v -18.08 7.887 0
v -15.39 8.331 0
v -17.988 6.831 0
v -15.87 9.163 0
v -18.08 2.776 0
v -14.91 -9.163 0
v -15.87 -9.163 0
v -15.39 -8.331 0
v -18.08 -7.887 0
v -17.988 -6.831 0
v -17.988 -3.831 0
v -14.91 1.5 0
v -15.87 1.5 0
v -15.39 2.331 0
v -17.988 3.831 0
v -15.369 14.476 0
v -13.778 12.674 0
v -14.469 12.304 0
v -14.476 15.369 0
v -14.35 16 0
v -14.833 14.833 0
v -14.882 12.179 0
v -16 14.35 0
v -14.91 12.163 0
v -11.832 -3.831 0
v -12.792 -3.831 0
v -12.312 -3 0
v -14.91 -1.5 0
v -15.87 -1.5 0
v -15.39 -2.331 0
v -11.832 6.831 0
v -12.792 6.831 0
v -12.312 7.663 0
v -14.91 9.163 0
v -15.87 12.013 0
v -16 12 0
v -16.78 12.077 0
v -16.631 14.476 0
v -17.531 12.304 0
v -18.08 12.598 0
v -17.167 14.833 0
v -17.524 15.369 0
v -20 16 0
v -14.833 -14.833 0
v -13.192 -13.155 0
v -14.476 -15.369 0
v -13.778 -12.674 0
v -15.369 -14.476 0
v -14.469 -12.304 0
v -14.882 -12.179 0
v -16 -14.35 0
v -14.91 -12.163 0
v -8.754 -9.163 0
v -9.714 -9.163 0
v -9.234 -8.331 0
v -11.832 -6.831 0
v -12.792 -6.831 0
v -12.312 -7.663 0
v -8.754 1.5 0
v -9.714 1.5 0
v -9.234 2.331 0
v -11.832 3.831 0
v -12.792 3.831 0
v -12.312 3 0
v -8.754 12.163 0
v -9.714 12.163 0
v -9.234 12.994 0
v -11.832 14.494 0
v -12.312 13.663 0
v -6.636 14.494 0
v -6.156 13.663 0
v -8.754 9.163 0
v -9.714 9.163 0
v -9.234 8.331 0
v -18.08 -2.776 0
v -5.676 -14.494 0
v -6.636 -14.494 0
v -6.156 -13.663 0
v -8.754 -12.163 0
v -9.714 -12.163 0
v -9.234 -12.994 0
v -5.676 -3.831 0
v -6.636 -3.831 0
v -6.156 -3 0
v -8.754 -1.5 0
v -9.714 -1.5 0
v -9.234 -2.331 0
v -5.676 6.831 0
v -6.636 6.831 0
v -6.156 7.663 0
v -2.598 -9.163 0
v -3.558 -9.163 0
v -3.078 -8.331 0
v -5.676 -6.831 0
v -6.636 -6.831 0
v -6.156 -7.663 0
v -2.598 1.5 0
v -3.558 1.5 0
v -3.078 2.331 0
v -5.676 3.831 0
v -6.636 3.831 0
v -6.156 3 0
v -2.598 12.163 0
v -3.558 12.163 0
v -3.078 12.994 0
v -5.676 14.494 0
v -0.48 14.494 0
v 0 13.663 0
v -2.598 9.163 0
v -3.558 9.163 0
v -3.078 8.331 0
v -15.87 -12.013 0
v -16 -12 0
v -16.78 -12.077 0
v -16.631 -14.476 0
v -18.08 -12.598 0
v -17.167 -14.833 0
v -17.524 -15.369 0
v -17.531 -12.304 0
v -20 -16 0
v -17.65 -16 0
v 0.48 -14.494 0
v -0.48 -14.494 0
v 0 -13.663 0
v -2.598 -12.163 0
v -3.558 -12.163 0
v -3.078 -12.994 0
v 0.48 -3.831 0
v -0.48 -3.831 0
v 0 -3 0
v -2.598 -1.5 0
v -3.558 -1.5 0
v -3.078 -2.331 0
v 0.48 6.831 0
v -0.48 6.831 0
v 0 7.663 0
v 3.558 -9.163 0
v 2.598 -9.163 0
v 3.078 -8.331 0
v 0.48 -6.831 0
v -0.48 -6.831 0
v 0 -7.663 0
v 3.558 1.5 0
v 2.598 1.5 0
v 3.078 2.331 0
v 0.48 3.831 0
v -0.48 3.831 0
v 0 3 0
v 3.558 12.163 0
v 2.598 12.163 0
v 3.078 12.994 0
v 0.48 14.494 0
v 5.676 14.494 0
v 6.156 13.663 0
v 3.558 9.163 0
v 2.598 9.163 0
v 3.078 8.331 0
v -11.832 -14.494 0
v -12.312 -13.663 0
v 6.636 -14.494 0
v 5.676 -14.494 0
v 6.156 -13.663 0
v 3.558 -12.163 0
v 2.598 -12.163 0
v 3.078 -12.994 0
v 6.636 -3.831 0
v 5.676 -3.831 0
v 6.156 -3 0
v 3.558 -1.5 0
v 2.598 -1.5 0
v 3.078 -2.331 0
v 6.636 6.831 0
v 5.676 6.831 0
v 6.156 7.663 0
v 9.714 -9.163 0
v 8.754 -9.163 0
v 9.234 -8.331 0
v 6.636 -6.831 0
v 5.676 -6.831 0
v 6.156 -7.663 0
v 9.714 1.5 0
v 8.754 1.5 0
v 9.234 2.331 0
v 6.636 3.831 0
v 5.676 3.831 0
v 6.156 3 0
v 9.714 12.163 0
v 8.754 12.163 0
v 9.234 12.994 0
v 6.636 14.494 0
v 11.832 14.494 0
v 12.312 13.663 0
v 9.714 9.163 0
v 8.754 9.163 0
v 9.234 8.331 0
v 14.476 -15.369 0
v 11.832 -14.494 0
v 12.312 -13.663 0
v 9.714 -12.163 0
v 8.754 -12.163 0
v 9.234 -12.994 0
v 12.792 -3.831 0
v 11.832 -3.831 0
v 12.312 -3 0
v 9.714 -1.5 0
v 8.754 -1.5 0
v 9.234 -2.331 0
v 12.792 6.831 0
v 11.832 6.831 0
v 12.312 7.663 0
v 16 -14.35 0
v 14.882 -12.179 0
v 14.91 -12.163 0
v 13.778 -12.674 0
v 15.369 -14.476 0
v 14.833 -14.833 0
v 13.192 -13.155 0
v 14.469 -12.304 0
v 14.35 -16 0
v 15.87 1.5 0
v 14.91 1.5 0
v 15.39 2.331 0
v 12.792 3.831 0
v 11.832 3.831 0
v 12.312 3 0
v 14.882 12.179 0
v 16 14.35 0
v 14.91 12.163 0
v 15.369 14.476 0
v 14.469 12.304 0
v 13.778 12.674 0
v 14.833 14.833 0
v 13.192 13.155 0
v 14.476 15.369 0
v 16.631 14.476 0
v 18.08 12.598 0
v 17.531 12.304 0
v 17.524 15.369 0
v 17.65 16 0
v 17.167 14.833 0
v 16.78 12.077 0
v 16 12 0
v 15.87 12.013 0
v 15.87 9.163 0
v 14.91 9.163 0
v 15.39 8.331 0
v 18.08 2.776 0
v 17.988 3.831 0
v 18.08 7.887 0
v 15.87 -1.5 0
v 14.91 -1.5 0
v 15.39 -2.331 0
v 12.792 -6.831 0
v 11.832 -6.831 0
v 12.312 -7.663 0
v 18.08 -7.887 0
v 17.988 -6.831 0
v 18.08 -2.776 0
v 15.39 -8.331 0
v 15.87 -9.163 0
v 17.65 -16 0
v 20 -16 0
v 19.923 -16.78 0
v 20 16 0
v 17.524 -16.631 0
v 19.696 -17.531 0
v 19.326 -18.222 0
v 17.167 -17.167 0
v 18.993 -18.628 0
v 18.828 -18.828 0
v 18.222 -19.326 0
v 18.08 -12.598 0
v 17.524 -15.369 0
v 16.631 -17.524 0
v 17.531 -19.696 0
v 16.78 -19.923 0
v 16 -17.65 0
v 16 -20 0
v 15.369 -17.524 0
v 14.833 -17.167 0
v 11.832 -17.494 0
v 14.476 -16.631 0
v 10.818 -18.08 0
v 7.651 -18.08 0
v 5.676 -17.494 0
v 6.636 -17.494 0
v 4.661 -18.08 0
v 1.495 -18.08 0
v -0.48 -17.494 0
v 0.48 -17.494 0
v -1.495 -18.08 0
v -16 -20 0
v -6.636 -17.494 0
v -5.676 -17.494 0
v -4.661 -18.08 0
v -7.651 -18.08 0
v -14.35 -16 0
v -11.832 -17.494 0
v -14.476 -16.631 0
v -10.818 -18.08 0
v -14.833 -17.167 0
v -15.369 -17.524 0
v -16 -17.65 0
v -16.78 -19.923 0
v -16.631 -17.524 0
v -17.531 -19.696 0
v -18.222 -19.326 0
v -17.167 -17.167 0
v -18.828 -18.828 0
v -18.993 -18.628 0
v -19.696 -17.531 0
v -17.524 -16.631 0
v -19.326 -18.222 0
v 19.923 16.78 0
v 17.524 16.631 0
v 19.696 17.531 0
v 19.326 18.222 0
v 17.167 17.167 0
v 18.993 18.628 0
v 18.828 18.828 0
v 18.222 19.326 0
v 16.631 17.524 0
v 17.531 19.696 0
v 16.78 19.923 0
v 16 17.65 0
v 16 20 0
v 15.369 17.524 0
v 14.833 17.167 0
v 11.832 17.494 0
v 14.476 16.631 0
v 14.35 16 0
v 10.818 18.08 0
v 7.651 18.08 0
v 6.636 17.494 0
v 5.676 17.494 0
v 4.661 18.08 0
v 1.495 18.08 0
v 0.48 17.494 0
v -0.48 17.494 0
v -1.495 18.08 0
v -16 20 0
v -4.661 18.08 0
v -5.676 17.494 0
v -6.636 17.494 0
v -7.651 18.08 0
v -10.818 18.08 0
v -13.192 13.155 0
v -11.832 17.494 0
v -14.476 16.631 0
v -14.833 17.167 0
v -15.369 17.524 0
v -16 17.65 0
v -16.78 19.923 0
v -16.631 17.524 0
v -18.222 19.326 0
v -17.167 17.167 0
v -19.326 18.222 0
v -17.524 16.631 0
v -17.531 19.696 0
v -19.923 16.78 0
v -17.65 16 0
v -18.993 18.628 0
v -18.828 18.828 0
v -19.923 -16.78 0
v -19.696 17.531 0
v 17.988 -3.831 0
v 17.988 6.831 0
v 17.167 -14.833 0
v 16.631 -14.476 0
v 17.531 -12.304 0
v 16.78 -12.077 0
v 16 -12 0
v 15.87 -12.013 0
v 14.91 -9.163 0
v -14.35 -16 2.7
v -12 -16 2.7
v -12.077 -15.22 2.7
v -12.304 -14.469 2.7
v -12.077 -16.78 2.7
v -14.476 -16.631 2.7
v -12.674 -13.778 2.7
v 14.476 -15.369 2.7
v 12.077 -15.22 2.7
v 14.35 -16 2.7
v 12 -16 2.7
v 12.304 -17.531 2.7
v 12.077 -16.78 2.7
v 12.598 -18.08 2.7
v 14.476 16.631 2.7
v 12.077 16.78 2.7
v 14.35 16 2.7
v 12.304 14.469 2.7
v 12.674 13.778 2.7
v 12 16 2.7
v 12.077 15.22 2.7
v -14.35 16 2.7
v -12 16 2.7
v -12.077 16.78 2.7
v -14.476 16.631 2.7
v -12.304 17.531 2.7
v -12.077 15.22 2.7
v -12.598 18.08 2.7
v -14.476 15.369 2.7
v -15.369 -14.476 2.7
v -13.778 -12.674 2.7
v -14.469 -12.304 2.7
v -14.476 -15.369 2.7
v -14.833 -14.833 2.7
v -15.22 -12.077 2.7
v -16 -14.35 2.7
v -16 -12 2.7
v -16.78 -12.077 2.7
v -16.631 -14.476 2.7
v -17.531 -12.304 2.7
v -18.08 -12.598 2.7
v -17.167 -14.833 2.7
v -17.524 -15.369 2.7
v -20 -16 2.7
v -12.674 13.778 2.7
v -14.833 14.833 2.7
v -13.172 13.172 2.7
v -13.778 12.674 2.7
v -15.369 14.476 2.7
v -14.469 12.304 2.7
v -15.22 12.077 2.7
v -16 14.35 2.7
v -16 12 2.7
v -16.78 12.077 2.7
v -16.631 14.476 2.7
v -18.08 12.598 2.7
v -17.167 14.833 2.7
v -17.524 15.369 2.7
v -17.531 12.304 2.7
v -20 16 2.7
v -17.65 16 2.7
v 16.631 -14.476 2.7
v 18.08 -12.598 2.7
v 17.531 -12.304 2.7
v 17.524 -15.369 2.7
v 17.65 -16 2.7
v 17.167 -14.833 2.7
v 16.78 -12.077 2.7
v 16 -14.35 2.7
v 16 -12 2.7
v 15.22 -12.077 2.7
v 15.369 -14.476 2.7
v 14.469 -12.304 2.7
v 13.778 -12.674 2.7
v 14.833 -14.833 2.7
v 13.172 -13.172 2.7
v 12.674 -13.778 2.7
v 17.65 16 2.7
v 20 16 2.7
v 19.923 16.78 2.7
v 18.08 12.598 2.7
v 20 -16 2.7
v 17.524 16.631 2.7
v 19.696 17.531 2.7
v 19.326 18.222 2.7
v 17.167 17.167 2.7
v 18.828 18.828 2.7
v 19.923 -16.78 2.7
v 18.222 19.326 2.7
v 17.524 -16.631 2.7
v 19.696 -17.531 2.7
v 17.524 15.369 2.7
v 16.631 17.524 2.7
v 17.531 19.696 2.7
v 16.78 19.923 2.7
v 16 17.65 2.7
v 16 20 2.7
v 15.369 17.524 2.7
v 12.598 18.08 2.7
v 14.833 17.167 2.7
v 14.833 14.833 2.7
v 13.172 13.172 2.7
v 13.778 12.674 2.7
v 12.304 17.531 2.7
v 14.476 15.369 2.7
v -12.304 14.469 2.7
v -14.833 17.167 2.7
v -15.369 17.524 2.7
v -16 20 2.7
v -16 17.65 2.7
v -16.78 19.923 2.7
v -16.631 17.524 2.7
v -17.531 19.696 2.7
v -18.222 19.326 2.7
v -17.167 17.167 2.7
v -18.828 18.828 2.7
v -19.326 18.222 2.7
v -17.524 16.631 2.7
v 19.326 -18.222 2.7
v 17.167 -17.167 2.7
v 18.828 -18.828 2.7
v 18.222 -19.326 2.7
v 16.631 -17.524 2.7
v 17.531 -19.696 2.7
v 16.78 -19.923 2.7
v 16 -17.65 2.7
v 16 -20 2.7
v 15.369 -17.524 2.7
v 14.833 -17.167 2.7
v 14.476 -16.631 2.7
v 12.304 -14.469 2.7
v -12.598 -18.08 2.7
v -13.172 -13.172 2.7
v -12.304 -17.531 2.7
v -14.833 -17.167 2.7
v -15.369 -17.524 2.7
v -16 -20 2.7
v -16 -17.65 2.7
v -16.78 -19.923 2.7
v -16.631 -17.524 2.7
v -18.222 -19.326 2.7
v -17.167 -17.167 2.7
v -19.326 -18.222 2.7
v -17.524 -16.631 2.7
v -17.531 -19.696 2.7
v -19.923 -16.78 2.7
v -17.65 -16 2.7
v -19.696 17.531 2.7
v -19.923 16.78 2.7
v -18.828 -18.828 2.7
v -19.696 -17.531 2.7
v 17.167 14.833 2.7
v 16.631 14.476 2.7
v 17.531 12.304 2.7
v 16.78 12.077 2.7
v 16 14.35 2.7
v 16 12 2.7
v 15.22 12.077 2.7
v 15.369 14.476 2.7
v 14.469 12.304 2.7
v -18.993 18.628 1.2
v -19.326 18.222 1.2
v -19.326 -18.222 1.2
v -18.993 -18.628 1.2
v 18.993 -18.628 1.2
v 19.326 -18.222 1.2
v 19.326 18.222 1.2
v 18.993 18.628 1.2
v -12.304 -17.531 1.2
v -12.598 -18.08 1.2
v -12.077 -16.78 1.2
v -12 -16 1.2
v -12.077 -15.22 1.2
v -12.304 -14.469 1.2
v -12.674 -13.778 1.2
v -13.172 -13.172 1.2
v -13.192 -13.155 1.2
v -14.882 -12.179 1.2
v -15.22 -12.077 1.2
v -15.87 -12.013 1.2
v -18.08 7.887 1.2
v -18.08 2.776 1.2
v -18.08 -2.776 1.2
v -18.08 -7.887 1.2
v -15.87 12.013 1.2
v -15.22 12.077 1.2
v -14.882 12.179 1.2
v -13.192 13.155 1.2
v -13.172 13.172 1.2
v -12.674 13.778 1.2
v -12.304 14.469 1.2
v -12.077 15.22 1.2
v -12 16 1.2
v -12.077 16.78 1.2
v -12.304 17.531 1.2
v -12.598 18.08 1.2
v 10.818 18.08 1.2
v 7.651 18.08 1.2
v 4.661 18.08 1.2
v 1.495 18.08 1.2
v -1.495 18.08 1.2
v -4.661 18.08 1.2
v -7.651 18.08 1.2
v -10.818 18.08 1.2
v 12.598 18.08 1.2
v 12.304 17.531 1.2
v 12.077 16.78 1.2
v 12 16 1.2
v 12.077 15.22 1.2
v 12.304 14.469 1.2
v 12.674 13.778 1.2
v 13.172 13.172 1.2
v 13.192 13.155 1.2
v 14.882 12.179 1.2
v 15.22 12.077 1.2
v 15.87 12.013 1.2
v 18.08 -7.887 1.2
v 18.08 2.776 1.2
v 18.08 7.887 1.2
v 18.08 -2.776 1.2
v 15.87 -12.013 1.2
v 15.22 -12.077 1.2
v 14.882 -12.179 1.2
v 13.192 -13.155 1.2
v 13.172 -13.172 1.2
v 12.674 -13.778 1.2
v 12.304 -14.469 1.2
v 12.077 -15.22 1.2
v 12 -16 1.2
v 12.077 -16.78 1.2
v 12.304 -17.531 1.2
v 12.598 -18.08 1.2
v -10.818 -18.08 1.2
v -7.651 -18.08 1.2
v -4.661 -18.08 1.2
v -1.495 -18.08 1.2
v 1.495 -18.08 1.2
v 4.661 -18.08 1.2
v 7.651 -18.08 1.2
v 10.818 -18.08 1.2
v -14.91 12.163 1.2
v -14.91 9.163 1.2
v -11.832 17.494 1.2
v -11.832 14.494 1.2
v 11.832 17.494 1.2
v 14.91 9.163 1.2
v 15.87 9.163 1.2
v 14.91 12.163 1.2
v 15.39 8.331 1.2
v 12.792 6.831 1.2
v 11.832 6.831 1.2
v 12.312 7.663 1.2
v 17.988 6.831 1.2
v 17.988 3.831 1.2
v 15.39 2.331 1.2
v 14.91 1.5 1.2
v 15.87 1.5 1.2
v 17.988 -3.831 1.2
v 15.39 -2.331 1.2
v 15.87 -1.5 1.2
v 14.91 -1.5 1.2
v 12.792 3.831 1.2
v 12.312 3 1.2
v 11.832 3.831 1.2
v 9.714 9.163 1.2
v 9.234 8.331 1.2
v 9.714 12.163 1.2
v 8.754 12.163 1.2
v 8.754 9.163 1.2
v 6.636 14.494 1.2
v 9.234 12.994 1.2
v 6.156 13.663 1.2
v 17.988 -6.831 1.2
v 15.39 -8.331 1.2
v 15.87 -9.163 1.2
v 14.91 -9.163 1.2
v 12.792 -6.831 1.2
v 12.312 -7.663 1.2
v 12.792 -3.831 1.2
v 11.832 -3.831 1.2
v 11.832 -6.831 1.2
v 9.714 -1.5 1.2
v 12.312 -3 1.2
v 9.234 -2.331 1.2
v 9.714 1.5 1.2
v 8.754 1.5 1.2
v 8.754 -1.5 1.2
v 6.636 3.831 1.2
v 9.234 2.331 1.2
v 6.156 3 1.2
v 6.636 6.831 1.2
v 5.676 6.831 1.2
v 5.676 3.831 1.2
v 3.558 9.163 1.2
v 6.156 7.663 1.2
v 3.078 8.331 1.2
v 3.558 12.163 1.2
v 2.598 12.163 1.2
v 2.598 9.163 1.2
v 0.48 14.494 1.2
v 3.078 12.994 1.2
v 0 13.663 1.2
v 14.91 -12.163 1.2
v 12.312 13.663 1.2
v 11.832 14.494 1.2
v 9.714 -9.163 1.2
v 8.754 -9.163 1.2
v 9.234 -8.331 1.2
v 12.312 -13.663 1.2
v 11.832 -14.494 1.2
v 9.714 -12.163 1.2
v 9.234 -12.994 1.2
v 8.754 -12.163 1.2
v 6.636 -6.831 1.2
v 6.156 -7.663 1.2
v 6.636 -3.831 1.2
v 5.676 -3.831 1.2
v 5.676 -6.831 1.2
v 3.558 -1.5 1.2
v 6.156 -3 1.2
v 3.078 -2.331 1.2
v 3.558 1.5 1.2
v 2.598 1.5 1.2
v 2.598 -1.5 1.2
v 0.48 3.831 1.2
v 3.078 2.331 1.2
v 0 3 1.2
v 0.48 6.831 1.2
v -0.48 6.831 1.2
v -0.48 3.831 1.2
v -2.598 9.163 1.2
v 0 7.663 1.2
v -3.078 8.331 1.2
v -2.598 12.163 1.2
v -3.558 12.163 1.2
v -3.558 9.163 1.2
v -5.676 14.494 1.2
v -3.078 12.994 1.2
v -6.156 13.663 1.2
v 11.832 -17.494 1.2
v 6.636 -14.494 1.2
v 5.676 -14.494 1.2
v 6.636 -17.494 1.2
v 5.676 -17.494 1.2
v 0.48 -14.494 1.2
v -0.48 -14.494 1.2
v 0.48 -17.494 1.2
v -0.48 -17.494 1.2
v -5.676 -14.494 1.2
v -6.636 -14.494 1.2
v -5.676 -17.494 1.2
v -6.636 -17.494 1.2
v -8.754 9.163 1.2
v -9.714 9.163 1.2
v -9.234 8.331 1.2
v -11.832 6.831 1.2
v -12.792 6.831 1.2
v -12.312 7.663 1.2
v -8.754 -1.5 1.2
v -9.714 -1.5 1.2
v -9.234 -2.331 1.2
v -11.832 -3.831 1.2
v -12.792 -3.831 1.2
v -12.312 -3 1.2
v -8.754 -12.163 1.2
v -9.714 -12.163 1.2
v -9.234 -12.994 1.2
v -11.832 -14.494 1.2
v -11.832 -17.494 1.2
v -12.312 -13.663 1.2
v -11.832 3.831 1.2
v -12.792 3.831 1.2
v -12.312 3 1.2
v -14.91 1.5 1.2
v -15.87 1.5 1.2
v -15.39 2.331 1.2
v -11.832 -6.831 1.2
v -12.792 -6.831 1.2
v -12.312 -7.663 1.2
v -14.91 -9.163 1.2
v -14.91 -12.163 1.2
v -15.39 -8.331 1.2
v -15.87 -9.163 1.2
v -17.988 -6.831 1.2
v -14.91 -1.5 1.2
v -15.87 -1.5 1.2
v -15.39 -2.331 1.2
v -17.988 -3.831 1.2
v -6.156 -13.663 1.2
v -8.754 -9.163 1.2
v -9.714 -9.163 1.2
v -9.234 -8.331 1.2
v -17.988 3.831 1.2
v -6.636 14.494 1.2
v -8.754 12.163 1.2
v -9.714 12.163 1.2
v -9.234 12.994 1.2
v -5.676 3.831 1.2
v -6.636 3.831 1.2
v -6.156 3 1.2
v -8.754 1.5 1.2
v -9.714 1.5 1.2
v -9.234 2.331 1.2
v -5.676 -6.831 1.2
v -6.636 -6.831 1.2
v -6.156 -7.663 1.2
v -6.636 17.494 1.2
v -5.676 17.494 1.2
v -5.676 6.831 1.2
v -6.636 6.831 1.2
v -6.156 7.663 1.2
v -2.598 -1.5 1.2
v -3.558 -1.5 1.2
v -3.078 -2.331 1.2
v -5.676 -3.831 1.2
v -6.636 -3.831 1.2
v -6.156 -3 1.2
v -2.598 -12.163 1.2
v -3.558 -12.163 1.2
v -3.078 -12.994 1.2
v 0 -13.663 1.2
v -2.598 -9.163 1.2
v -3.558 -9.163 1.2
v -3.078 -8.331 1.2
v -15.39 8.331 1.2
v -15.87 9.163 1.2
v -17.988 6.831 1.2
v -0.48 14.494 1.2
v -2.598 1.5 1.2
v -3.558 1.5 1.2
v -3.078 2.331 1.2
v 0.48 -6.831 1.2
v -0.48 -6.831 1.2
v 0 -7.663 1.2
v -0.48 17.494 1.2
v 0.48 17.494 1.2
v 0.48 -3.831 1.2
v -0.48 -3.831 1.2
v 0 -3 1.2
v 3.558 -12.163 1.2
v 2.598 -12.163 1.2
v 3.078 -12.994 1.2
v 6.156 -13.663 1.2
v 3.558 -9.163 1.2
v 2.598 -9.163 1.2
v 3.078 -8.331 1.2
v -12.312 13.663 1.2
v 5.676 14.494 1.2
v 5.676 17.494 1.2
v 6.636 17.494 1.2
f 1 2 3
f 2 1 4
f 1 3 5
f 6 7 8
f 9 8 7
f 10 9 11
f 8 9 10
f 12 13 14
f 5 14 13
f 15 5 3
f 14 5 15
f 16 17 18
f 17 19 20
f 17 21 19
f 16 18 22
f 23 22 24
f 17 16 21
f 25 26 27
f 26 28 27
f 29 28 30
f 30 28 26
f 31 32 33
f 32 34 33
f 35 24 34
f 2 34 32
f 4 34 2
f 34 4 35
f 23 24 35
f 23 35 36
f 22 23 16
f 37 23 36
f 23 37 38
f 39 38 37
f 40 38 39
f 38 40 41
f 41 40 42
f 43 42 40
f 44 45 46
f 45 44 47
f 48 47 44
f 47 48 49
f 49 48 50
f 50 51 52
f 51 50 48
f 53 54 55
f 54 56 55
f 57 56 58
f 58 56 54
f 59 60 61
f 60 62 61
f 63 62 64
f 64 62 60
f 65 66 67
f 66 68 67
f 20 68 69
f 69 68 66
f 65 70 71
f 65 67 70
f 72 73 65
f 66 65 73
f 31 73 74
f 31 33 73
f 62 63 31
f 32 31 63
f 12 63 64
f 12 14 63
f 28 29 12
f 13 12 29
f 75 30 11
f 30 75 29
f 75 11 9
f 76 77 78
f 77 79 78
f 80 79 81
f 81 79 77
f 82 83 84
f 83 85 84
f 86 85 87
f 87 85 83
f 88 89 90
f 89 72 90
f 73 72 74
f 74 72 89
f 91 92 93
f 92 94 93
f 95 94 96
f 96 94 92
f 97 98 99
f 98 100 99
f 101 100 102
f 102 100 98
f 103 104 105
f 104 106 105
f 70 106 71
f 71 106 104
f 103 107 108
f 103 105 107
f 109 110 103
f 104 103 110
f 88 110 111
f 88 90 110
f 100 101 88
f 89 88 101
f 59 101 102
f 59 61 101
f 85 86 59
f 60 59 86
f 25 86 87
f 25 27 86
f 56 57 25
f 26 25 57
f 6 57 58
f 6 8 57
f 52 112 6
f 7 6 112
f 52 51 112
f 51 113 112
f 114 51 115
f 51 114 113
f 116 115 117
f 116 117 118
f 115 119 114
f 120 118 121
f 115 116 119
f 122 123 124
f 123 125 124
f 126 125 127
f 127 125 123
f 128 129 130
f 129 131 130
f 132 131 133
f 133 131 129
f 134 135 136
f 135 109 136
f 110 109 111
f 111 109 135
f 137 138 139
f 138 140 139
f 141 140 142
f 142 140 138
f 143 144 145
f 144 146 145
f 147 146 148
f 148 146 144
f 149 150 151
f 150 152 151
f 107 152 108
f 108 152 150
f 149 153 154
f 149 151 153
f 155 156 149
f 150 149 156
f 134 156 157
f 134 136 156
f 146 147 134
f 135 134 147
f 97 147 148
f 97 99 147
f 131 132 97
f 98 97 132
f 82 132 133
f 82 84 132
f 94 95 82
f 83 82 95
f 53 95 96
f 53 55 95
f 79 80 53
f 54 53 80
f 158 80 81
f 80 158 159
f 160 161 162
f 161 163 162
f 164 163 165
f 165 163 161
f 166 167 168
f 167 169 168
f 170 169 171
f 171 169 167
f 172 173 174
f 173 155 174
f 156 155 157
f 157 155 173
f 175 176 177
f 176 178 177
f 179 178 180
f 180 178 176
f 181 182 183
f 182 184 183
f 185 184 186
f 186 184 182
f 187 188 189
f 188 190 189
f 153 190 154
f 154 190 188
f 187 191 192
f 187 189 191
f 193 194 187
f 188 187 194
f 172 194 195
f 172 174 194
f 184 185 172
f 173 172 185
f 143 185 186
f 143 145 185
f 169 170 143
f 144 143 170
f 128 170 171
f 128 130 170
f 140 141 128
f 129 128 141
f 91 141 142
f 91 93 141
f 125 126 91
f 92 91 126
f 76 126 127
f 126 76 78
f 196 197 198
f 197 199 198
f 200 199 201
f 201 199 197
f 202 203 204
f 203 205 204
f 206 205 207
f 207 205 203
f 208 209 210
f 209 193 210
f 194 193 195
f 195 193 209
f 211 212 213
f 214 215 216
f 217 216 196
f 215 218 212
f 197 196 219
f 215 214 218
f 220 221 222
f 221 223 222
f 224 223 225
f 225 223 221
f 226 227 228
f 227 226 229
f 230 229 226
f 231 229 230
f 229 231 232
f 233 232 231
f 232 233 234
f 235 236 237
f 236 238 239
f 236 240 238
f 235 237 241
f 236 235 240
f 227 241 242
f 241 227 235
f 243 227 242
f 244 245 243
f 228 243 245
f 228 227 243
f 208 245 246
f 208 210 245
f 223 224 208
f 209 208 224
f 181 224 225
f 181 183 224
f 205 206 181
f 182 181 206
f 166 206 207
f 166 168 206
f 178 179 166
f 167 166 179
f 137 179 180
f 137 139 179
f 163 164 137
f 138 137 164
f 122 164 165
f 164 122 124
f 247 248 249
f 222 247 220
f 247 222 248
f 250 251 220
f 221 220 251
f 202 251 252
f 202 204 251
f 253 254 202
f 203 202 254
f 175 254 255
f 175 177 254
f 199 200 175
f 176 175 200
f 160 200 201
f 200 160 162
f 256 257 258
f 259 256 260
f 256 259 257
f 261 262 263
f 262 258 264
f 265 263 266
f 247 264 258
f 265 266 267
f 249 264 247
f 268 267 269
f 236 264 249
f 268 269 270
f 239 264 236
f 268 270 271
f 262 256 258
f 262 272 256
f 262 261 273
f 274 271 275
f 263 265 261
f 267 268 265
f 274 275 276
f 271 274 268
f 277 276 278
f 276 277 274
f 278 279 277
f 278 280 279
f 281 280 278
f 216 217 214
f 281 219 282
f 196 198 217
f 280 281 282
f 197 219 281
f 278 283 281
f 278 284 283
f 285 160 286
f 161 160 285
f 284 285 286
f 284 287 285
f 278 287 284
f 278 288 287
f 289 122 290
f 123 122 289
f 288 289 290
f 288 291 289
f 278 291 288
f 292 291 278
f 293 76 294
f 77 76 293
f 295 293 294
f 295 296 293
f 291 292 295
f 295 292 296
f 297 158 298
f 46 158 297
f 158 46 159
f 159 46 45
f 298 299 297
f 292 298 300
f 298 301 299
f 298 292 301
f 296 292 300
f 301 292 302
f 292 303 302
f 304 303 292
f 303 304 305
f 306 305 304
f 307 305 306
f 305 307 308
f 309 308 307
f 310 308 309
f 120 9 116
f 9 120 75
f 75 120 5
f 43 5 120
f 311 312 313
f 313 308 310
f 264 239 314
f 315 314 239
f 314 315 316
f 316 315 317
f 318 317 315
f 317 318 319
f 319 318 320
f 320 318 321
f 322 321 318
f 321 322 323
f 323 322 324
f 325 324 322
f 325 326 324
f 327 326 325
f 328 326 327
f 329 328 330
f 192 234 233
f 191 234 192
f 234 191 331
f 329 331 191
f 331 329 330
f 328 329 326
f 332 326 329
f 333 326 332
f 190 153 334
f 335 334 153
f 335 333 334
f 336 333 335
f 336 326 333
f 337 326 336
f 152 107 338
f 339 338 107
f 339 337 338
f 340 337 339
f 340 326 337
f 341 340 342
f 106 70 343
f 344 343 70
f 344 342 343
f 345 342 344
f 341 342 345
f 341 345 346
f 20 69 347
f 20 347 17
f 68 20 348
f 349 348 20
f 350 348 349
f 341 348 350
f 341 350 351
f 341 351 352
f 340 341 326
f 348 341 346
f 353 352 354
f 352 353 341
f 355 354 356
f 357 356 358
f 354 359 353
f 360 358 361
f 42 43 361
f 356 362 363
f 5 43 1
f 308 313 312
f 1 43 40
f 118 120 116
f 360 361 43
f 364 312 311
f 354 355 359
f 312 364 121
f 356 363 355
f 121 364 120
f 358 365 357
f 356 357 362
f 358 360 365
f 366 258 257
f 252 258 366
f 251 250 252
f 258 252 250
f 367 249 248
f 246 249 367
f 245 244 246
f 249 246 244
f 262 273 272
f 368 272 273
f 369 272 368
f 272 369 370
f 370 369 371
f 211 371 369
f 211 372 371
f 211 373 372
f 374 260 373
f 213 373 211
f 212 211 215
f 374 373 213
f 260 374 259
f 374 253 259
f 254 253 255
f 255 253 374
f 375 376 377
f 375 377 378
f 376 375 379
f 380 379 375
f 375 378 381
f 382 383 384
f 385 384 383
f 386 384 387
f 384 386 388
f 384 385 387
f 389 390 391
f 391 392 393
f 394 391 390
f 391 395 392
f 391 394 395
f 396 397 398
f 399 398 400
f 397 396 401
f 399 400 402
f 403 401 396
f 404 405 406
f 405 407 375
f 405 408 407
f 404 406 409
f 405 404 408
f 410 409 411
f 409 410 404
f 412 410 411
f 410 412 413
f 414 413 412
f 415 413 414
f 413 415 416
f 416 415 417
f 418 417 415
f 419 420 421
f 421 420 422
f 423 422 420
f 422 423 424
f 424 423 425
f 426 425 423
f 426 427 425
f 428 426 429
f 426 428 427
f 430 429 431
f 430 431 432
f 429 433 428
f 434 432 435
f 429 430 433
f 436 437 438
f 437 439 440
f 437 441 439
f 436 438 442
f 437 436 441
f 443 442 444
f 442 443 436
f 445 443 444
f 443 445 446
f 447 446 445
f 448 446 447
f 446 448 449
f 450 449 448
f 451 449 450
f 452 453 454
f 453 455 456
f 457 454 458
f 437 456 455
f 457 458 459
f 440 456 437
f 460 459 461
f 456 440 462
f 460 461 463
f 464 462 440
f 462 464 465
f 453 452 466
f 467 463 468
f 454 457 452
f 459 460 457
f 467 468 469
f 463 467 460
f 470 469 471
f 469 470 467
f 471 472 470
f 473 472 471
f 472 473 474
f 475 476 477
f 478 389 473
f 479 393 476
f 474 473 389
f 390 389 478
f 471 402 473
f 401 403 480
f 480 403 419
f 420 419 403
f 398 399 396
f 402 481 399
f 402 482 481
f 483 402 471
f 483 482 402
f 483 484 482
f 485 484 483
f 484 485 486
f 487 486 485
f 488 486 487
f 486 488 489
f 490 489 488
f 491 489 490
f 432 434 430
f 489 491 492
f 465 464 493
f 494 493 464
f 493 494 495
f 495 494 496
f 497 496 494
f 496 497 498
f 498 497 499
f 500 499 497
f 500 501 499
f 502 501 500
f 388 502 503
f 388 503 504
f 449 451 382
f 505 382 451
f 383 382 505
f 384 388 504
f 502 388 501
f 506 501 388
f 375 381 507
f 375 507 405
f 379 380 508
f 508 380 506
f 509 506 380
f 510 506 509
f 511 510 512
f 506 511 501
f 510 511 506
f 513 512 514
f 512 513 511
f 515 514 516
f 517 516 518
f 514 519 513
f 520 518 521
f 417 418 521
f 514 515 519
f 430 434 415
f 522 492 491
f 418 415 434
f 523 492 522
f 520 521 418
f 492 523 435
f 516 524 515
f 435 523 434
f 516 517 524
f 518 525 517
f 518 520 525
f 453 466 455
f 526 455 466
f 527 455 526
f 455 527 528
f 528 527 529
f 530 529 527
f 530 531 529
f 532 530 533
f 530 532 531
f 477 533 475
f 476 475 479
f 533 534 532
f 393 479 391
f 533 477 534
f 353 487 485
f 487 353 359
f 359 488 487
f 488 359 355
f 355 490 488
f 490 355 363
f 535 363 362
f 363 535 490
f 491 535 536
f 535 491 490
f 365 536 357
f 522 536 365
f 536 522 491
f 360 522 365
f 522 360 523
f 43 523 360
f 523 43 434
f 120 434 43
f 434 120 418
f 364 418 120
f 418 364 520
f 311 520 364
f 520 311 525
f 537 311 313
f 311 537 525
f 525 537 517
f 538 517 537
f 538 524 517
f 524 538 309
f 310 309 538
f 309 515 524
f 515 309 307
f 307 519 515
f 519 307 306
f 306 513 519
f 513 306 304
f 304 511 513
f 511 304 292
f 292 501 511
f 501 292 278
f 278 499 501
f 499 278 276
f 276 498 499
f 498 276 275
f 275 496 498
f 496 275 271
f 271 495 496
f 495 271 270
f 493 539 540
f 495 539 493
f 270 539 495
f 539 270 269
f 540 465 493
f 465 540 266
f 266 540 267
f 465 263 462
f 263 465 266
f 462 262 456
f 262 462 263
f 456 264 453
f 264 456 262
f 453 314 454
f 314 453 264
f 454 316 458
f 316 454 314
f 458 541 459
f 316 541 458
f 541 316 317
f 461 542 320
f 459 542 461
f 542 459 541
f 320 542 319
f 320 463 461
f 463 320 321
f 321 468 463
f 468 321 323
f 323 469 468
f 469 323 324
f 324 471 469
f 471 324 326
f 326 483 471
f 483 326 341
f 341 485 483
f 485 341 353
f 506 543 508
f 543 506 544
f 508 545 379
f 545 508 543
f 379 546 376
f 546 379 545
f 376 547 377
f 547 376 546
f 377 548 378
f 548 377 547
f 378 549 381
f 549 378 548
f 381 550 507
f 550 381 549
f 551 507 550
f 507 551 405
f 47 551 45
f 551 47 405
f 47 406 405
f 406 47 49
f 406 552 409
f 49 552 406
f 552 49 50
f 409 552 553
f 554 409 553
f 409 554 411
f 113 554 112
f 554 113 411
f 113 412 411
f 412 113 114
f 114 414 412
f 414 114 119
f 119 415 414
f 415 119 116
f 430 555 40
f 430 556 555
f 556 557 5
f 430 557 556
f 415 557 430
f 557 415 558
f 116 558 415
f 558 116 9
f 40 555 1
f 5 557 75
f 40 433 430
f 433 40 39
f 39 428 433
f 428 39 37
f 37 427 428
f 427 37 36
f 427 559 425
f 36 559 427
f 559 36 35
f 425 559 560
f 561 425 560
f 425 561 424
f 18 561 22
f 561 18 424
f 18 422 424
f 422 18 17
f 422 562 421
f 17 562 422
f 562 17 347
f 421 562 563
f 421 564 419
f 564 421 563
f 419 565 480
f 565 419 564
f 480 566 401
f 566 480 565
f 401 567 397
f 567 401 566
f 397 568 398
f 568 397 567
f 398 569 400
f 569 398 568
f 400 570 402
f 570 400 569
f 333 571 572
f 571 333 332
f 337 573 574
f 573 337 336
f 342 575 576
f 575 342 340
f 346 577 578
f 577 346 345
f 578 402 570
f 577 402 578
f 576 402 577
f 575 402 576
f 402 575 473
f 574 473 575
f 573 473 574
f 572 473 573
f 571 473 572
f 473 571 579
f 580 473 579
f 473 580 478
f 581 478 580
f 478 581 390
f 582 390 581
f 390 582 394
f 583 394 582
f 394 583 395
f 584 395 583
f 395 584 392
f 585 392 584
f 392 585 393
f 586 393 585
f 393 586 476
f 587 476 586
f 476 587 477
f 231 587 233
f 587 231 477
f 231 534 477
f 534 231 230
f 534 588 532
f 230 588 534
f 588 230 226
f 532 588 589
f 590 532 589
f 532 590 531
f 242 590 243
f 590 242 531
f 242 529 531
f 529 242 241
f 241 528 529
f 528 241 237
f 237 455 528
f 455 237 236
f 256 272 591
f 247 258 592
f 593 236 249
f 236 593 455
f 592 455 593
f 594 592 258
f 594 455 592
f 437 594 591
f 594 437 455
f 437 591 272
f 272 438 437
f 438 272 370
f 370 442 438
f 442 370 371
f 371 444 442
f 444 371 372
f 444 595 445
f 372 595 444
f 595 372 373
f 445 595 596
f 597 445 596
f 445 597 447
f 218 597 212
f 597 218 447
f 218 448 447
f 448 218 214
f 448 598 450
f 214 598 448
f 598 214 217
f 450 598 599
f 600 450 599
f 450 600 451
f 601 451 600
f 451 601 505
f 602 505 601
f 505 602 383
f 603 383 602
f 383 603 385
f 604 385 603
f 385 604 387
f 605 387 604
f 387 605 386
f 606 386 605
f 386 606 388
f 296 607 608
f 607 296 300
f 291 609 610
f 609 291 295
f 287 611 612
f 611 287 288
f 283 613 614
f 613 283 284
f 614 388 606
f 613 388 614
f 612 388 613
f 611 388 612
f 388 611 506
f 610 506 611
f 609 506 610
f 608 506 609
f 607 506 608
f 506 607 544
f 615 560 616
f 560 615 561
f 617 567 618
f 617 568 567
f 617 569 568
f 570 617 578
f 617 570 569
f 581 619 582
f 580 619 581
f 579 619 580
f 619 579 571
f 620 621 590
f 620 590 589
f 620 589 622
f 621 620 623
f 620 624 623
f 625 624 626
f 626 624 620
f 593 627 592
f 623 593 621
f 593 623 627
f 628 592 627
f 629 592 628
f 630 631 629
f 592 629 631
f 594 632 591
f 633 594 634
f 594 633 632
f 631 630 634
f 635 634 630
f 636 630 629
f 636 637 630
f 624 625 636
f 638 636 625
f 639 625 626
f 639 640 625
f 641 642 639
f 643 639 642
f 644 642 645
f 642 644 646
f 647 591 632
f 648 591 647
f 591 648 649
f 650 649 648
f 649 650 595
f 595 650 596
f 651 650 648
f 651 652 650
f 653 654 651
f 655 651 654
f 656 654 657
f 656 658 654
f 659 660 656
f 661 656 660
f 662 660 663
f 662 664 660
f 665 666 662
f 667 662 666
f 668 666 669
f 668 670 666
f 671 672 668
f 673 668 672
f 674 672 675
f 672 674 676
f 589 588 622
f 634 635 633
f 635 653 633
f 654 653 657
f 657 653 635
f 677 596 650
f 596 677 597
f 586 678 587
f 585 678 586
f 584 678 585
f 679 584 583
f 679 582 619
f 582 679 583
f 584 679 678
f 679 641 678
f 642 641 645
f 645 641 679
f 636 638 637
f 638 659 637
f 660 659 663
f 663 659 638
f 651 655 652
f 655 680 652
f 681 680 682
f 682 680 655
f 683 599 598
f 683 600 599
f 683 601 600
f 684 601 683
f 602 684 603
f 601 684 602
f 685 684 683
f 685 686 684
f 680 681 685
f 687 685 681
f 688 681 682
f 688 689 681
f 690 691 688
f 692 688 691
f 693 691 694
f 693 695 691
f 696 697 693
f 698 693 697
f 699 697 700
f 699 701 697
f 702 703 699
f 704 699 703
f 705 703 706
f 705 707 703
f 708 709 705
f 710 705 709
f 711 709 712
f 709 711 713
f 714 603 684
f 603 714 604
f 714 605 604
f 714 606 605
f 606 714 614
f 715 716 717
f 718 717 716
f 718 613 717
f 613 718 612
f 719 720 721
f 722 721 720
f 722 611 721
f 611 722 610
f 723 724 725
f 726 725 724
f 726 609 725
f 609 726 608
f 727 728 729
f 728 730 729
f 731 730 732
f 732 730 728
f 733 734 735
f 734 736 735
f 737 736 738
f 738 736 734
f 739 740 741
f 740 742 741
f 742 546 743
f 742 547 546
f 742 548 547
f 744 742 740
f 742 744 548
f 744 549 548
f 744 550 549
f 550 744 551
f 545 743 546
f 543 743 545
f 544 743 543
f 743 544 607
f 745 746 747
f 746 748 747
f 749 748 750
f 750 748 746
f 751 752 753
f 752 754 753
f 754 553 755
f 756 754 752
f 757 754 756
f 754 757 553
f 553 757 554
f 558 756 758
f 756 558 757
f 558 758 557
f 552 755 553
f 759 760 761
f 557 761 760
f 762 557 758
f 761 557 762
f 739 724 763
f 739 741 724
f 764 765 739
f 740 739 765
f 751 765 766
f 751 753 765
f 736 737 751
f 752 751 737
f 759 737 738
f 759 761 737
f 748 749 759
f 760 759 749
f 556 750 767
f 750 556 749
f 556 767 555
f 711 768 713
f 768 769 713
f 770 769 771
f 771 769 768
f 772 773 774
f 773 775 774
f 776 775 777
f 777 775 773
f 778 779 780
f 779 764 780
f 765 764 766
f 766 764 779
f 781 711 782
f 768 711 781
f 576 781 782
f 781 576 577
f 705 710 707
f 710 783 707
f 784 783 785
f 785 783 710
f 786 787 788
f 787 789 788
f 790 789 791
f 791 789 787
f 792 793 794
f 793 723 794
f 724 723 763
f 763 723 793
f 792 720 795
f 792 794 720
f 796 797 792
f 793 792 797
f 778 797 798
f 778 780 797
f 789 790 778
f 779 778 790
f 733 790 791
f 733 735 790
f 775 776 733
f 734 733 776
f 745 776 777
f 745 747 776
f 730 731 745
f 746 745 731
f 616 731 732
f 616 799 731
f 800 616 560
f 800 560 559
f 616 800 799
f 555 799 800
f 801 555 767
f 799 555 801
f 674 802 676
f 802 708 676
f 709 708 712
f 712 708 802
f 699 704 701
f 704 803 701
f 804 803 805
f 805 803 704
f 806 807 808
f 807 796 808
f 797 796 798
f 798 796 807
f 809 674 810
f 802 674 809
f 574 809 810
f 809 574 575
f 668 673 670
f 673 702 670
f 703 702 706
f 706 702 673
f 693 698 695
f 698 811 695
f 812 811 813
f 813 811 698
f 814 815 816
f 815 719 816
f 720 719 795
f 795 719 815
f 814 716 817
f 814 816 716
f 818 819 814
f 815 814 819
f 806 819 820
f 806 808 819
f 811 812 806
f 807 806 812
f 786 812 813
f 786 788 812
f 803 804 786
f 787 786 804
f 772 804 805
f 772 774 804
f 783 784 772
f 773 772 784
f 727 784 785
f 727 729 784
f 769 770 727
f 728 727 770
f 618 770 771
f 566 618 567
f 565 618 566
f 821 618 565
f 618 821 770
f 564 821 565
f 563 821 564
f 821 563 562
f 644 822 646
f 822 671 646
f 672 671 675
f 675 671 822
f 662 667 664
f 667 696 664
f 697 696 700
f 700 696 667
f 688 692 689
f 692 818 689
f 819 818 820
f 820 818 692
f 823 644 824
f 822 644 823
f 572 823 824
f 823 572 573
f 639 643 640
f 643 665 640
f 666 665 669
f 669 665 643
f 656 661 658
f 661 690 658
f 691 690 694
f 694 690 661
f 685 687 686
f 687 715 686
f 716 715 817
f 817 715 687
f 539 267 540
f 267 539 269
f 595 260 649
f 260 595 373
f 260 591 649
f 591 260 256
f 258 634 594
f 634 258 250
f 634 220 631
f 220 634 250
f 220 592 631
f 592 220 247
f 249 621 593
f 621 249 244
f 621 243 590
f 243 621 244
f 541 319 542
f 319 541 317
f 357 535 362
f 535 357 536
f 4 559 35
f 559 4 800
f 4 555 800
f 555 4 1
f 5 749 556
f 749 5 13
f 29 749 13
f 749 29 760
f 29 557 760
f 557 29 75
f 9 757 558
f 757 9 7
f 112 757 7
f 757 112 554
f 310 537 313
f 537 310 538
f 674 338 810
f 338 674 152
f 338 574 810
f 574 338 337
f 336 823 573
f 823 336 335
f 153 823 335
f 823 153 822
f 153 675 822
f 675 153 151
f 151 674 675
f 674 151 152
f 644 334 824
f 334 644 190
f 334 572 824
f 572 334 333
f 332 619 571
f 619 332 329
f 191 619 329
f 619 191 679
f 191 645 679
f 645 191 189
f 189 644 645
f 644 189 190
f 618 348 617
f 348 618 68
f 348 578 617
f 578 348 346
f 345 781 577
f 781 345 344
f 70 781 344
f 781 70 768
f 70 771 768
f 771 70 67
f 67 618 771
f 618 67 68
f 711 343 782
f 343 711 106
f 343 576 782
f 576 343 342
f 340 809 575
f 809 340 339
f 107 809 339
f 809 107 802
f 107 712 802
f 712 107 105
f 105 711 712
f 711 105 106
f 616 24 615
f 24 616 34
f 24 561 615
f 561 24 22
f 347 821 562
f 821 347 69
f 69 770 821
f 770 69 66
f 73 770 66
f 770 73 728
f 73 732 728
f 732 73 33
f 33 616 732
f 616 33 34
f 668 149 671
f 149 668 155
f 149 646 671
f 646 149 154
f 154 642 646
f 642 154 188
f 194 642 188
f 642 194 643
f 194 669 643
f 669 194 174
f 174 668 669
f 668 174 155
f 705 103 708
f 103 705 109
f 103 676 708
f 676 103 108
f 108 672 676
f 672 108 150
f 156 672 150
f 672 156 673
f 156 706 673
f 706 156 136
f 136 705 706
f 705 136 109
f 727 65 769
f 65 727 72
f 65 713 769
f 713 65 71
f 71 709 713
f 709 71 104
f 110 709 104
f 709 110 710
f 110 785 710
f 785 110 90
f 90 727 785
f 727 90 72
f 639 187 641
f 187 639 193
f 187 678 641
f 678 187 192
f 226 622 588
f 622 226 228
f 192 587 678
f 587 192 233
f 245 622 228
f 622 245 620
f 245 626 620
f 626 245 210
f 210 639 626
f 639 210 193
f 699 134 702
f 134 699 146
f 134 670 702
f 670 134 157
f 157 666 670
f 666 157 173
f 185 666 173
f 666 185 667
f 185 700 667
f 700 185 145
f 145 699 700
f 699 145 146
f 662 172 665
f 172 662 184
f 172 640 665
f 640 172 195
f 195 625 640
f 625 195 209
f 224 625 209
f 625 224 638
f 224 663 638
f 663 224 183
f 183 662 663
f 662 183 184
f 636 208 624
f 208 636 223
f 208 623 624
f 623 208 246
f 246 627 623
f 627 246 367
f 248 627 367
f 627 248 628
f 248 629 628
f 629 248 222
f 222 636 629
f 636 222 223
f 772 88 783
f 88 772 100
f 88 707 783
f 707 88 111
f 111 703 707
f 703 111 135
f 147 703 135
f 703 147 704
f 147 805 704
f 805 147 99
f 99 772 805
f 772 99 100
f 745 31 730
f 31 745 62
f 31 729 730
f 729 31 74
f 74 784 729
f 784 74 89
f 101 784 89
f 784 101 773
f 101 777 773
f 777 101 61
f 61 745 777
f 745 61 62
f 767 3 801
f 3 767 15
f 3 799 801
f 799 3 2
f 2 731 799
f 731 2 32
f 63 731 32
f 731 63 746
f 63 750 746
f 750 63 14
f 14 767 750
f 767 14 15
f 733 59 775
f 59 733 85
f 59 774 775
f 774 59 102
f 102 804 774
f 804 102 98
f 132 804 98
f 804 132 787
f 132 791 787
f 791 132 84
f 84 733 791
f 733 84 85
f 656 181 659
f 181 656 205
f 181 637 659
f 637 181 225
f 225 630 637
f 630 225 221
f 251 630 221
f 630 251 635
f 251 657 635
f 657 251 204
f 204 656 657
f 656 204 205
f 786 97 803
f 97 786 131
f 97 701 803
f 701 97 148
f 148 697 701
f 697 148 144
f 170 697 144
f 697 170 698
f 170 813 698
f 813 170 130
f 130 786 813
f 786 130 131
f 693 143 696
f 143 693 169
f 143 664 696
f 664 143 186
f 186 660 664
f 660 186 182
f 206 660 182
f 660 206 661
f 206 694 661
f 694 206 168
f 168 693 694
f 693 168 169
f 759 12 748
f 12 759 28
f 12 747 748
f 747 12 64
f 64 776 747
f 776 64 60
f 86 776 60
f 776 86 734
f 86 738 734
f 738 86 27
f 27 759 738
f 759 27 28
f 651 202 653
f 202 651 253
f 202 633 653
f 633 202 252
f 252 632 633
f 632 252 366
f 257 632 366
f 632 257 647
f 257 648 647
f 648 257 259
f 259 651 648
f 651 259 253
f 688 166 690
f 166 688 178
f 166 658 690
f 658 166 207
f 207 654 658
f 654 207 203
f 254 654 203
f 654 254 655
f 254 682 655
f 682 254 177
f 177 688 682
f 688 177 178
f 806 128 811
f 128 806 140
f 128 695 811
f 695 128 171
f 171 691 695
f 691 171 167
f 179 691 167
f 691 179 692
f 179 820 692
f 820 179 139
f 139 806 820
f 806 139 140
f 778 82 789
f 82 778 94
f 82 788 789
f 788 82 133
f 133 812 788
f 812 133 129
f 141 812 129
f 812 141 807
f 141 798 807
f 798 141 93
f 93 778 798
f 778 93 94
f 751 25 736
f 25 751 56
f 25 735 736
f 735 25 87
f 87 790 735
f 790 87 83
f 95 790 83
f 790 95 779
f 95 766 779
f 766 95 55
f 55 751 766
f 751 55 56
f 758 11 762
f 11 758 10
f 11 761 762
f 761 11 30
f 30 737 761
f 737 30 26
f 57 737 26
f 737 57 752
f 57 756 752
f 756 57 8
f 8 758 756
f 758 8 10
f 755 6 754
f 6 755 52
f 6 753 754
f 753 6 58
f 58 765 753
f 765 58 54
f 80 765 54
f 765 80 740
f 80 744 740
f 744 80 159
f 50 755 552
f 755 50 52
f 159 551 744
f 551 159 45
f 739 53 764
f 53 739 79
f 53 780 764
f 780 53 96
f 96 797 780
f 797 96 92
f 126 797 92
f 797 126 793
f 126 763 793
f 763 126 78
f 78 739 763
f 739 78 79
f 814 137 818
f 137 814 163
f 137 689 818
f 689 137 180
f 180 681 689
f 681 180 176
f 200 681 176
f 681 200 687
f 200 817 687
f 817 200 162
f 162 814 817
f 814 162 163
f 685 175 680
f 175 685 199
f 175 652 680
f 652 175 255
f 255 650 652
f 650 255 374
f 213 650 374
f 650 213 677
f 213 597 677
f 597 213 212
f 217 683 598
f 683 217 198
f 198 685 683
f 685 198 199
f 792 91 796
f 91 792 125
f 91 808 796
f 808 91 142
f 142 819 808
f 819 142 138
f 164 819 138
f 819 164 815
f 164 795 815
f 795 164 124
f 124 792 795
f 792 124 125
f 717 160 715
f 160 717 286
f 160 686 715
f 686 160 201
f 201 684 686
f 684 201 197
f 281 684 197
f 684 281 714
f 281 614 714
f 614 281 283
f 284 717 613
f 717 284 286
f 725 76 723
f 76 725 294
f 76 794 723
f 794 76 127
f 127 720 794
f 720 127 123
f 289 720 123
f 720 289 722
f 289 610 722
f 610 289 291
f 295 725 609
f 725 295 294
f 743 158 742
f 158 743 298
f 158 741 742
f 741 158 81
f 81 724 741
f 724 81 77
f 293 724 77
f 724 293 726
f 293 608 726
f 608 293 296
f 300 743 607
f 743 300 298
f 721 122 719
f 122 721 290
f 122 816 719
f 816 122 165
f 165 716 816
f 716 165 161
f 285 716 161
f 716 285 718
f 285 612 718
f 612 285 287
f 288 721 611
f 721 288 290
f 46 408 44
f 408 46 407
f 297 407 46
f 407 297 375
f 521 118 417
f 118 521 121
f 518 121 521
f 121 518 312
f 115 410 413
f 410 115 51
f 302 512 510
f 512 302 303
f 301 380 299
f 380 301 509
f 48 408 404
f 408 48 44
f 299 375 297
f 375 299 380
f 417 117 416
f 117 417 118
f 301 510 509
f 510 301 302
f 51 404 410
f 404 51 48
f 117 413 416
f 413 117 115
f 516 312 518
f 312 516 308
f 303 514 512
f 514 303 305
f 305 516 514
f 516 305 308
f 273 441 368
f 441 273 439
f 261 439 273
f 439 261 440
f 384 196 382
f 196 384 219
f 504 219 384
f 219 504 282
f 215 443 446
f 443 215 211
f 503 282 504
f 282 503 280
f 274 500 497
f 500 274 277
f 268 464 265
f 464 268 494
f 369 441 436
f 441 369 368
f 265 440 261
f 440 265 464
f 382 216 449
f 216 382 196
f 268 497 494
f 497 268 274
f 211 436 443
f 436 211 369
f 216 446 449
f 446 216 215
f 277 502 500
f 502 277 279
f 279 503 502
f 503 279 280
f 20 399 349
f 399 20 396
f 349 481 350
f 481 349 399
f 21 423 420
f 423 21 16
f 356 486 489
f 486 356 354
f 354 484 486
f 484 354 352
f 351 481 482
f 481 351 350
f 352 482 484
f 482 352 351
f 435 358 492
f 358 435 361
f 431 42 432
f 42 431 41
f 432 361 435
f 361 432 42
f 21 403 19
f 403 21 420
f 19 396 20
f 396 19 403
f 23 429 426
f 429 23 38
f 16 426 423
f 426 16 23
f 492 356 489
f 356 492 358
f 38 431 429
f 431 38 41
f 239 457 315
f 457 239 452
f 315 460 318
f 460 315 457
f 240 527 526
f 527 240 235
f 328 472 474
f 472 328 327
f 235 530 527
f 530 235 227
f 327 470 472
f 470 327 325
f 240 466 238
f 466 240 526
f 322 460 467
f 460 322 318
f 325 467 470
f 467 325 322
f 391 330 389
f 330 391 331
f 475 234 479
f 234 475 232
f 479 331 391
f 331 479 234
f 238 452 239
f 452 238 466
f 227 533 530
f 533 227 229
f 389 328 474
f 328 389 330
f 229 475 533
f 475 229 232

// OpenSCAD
/*
 * Customizable Fan Cover - https://www.thingiverse.com/thing:2802474
 * by Dennis Hofmann - https://www.thingiverse.com/mightynozzle/about
 * created 2018-02-22
 * updated 2018-03-27
 * version v1.2
 *
 * Changelog
 * --------------
 * v1.2:
 *      - better quality of rounded corners and crosshair pattern
 * v1.1:
 *      - added support line option for crosshair and square pattern
 * v1.0:
 *      - final design
 * --------------
 *
 * This work is licensed under the Creative Commons - Attribution - Non-Commercial - ShareAlike license.
 * https://creativecommons.org/licenses/by-nc-sa/3.0/
 */


 // Parameter Section //
//-------------------//

/* [Global Settings] */

// Choose between presets of known and common fan sizes.
fan_preset = "40"; //[25:25mm,30:30mm,40:40mm,50:50mm,60:60mm,70:70mm,80:80mm,92:92mm,120:120mm,140:140mm,custom:Custom Fan Settings]

// If you want save to save about 40% filament and about 20% printing time, you can choose the reduced frame option.
frame_option = "reduced"; //[full,reduced]

// Minimum Border Size. I recommend to use two/four/six... times of your line width setting of your slicer. Simplify3D uses 0.48mm line width by default if you are using a 0.4mm nozzle. Cura uses 0.4mm line width.
min_border_size_in_millimeter = 1.92;

// Choose between a grill pattern
grill_pattern = "honeycomb"; //[honeycomb,grid,line,triangle,crosshair,square,dot,aperture]

// Set the angle of the pattern around the center of the cover.
grill_pattern_rotation = 0; //[0:5:360]

// Size of the pattern lines. I recommend to use two/four/six... times of your line width setting of your slicer. Simplify3D uses 0.48mm line width by default if you are using a 0.4mm nozzle. Cura uses 0.4mm line width.
line_size_in_millimter = 0.96; //[0.3:0.02:4]

// Space between two lines of your pattern. If you choose aperture pattern, this value set the size of the center octagon.
line_space_in_millimeter = 6; //[1:0.1:50]

// If you need countersunk holes, you can activate it here. Bottom = first layer. Top = last layer. 
screw_hole_chamfer = "no"; //[no,top,bottom,top_and_bottom]

// Activate or deactivate rounded corners. The radius will be automatically calculated.
rounded_corners = "yes"; //[yes,no]

// number of straight lines supporting the crosshair or square pattern.
number_of_support_lines = 2;  //[1:1:36]

/* [Custom Fan Settings] */

// Cover size. E.g. 80 for a 80mm Fan
cover_size_in_millimeter = 40;

// E.g. 2.9 for M2.5, 3.3 for M3, 4.4 for M4
screw_hole_diameter_in_millimeter = 3.3;

// 25mm fan: 20 | 30mm fan: 24 | 40mm fan: 32 | 50mm fan: 40 | 60mm fan: 50 | 70mm fan: 61.5 | 80mm fan: 71.5 | 92mm fan: 82.5 | 120mm fan: 105 | 140mm fan: 126 
screw_hole_distance_in_millimeter = 32;

// Height of the outer frame of the cover
cover_height_in_millimeter = 3;

// Height of the pattern inside the cover frame
grill_pattern_height_in_millimeter = 1;

/* [Hidden] */
min_border_size = min_border_size_in_millimeter;
line_size = line_size_in_millimter;
line_space = line_space_in_millimeter;

 // Program Section //
//-----------------//

if(fan_preset == "25") {
    fan_cover(cover_size = 25, screw_hole_dia = 2.9, screw_hole_distance = 20, cover_h = 2, grill_pattern_h = 1);
}
if(fan_preset == "30") {
    fan_cover(cover_size = 30, screw_hole_dia = 3.3, screw_hole_distance = 24, cover_h = 2.5, grill_pattern_h = 1.1);
}
if(fan_preset == "40") {
    fan_cover(cover_size = 40, screw_hole_dia = 3.3, screw_hole_distance = 32, cover_h = 2.7, grill_pattern_h = 1.2);
}
if(fan_preset == "50") {
    fan_cover(cover_size = 50, screw_hole_dia = 4.4, screw_hole_distance = 40, cover_h = 2.9, grill_pattern_h = 1.3);
}
if(fan_preset == "60") {
    fan_cover(cover_size = 60, screw_hole_dia = 4.4, screw_hole_distance = 50, cover_h = 3, grill_pattern_h = 1.3);
}
if(fan_preset == "70") {
    fan_cover(cover_size = 70, screw_hole_dia = 4.4, screw_hole_distance = 61.5, cover_h = 3, grill_pattern_h = 1.4);
}
if(fan_preset == "80") {
    fan_cover(cover_size = 80, screw_hole_dia = 4.4, screw_hole_distance = 71.5, cover_h = 3.2, grill_pattern_h = 1.5);
}
if(fan_preset == "92") {
    fan_cover(cover_size = 92, screw_hole_dia = 4.4, screw_hole_distance = 82.5, cover_h = 3.5, grill_pattern_h = 1.6);
}
if(fan_preset == "120") {
    fan_cover(cover_size = 120, screw_hole_dia = 4.4, screw_hole_distance = 105, cover_h = 4, grill_pattern_h = 1.8);
}
if(fan_preset == "140") {
    fan_cover(cover_size = 140, screw_hole_dia = 4.4, screw_hole_distance = 126, cover_h = 4.5, grill_pattern_h = 2.0);
}
if(fan_preset == "custom") {
    fan_cover(cover_size = cover_size_in_millimeter, screw_hole_dia = screw_hole_diameter_in_millimeter, screw_hole_distance = screw_hole_distance_in_millimeter, cover_h = cover_height_in_millimeter, grill_pattern_h = grill_pattern_height_in_millimeter);
}


 // Module Section //
//----------------//

module fan_cover(cover_size, screw_hole_dia, screw_hole_distance, cover_h, grill_pattern_h) {
    corner_size = cover_size - screw_hole_distance;
    corner_r = rounded_corners == "yes" ? corner_size / 2 : 0;
    screw_pos = (cover_size - corner_size) / 2;
    color("DodgerBlue") difference() {
        union() {
            linear_extrude(height = cover_h, convexity = 20) {
                difference() {
                    offset(r=corner_r, $fn = ceil(corner_r * 8)) {
                        offset(r=-corner_r) {
                            square([cover_size, cover_size], center = true);
                        }
                    }
                    if(frame_option == "reduced") {
                        offset(r=corner_r, $fn = ceil(corner_r * 8)) {
                            offset(r=-corner_r) {
                                square([cover_size - min_border_size*2, cover_size - min_border_size*2], center = true);
                            }
                        }
                    }
                    if(frame_option == "full") {
                        circle(d = cover_size - min_border_size * 2, $fn = cover_size);
                    }
                } 
                if(frame_option == "reduced") {
                    for(y = [-1:2:1]) {
                        for(x = [-1:2:1]) {
                            translate([screw_pos * x, screw_pos * y, -2]) {
                                circle(d = corner_size, $fn = ceil(corner_r * 8));
                            }
                        }
                    }
                }
            }
            linear_extrude(height = grill_pattern_h, convexity = 20) {
                intersection() {
                    offset(r=corner_r, $fn = ceil(corner_r * 8)) {
                        offset(r=-corner_r) {
                            square([cover_size, cover_size], center = true);
                        }
                    }
                    rotate(grill_pattern_rotation) {
                        if(grill_pattern == "honeycomb") {
                            honeycomb_pattern(cover_size, line_size, line_space);
                        }
                        if(grill_pattern == "grid") {
                            grid_pattern(cover_size, line_size, line_space);
                        }
                        if(grill_pattern == "line") {
                            line_pattern(cover_size, line_size, line_space);
                        }
                        if(grill_pattern == "triangle") {
                            triangle_pattern(cover_size, line_size, line_space);
                        }
                        if(grill_pattern == "crosshair") {
                            crosshair_pattern(cover_size, line_size, line_space);
                        }
                        if(grill_pattern == "square") {
                            square_pattern(cover_size, line_size, line_space);
                        }
                        if(grill_pattern == "dot") {
                            dot_pattern(cover_size, line_size, line_space);
                        }
                        if(grill_pattern == "aperture") {
                            aperture_pattern(cover_size, line_size, line_space);
                        }
                        
                    }
                }
            }
        }
        for(y = [-1:2:1]) {
            for(x = [-1:2:1]) {
                translate([screw_pos * x, screw_pos * y, -2]) {
                    screw_hole(cover_h, screw_hole_dia);
                }
            }
        }
    }
}

module screw_hole(cover_h, screw_hole_dia) {
    cylinder(h = cover_h + 4, d = screw_hole_dia, $fn = 16);
    if(screw_hole_chamfer == "bottom" || screw_hole_chamfer == "top_and_bottom") {
        translate([0, 0, 2.9 - screw_hole_dia]) {
            cylinder(h = screw_hole_dia, d1 = screw_hole_dia * 4, d2 = screw_hole_dia);
        }
    }
    if(screw_hole_chamfer == "top" || screw_hole_chamfer == "top_and_bottom") {
        translate([0, 0, cover_h + screw_hole_dia/4]) {
            cylinder(h = screw_hole_dia, d2 = screw_hole_dia * 4, d1 = screw_hole_dia);
        }
    }
}

module grid_pattern(size, line_size, line_space) {
    num = ceil(size / (line_size + line_space) * 1.42);
    for(x = [floor(-num / 2) : ceil(num / 2)]) {
        translate([x * (line_size + line_space), 0]) {
            square([line_size, num *(line_size + line_space)], center=true);
        }
        rotate(90) {
            translate([x * (line_size + line_space), 0]) {
                square([line_size, num *(line_size + line_space)], center = true);
            }
        }
    }
}

module triangle_pattern(size, line_size, line_space) {
    num = ceil(size / (line_size + line_space) * 1.42);
    for(x = [floor(-num / 2):ceil(num / 2)]) {
        translate([x * (line_size + line_space), 0]) {
            square([line_size, num *(line_size + line_space)], center = true);
        }
        rotate(60) {
            translate([x * (line_size + line_space), 0]) {
                square([line_size, num *(line_size + line_space)], center = true);
            }
        }
        rotate(120) {
            translate([x * (line_size + line_space), 0]) {
                square([line_size, num *(line_size + line_space)], center = true);
            }
        }
    }
}

module line_pattern(size, line_size, line_space) {
    num = ceil(size / (line_size + line_space)*1.42);
    for(x = [floor(-num / 2):ceil(num / 2)]) {
        translate([x * (line_size + line_space), 0]) {
            square([line_size, num *(line_size + line_space)], center=true);
        }
    }
}

module crosshair_pattern(size, line_size, line_space) {
    line = (line_size + line_space) * 2;
    num = ceil(size / line * 1.42);
    for(n = [1:num]) {
        difference() {
            circle(d = n * line + line_size * 2, $fn = ceil(n * line + line_size * 2));
            circle(d = n * line, $fn = ceil(n * line + line_size * 2));
        }
    }
    for(rot=[0:90 / number_of_support_lines * 2:180]) {
        rotate(rot + 45) square([size * 2, line_size], center = true);
    }
}

module square_pattern(size, line_size, line_space) {
    line = (line_size + line_space) * 2;
    num = ceil(size / line * 1.42); 
    for(n = [1:num]) {
        difference() {
            square([n * line + line_size * 2, n * line + line_size * 2], center = true);
            square([n * line, n * line], center = true);
        }
    }
    for(rot=[0:90 / number_of_support_lines * 2:180]) {
        rotate(rot + 45) square([size * 2, line_size], center = true);
    }
}

module honeycomb_pattern(size, line_size, line_space) {
    min_rad = (line_space / 2 * sqrt(3)) / 2 + line_size / 2;
    y_offset = sqrt(min_rad * min_rad * 4 - min_rad * min_rad);
    num_x = ceil(size / min_rad / 2) * 1.42;
    num_y = ceil(size / y_offset) * 1.42;
    difference() {
        square([size * 1.42, size * 1.42], center = true);
        for(y = [floor(-num_y / 2) : ceil(num_y / 2)]) {
            odd = (y % 2 == 0) ? 0 : min_rad;
            for(x = [floor(-num_x / 2) : ceil(num_x / 2)]) {
                translate([x * min_rad * 2 + odd, y * y_offset]) {
                    rotate(30) {
                        circle(d=line_space, $fn=6);
                    }
                }
            }
        }
    }
}

module dot_pattern(size, line_size, line_space) {
    rad = line_space / 2;
    y_offset = sqrt((rad + line_size / 2) * (rad + line_size / 2) * 4 - (rad + line_size / 2) * (rad + line_size / 2));
    num_x = ceil(size / rad / 2) * 1.42;
    num_y = ceil(size / y_offset) * 1.42;
    difference() {
        square([size * 1.42, size * 1.42], center = true);
        for(y = [floor(-num_y / 2) : ceil(num_y / 2)]) {
            odd = (y % 2 == 0) ? 0 : rad + line_size / 2;
            for(x = [floor(-num_x / 2) : ceil(num_x / 2)]) {
                translate([x * (rad + line_size / 2) * 2 + odd, y * y_offset]) {
                    rotate(30) {
                        circle(d=line_space);
                    }
                }
            }
        }
    }
}

module aperture_pattern(size, line_size, line_space) {
    circle(d = line_space, $fn = 8);
    for(rot = [1:2:15]) {
        rotate(360 / 16 * rot) {
            translate([line_space / 2 * cos(360 / 16) - line_size, -line_size]) {
                square([line_size, size]);
            }
        }
    }
}
